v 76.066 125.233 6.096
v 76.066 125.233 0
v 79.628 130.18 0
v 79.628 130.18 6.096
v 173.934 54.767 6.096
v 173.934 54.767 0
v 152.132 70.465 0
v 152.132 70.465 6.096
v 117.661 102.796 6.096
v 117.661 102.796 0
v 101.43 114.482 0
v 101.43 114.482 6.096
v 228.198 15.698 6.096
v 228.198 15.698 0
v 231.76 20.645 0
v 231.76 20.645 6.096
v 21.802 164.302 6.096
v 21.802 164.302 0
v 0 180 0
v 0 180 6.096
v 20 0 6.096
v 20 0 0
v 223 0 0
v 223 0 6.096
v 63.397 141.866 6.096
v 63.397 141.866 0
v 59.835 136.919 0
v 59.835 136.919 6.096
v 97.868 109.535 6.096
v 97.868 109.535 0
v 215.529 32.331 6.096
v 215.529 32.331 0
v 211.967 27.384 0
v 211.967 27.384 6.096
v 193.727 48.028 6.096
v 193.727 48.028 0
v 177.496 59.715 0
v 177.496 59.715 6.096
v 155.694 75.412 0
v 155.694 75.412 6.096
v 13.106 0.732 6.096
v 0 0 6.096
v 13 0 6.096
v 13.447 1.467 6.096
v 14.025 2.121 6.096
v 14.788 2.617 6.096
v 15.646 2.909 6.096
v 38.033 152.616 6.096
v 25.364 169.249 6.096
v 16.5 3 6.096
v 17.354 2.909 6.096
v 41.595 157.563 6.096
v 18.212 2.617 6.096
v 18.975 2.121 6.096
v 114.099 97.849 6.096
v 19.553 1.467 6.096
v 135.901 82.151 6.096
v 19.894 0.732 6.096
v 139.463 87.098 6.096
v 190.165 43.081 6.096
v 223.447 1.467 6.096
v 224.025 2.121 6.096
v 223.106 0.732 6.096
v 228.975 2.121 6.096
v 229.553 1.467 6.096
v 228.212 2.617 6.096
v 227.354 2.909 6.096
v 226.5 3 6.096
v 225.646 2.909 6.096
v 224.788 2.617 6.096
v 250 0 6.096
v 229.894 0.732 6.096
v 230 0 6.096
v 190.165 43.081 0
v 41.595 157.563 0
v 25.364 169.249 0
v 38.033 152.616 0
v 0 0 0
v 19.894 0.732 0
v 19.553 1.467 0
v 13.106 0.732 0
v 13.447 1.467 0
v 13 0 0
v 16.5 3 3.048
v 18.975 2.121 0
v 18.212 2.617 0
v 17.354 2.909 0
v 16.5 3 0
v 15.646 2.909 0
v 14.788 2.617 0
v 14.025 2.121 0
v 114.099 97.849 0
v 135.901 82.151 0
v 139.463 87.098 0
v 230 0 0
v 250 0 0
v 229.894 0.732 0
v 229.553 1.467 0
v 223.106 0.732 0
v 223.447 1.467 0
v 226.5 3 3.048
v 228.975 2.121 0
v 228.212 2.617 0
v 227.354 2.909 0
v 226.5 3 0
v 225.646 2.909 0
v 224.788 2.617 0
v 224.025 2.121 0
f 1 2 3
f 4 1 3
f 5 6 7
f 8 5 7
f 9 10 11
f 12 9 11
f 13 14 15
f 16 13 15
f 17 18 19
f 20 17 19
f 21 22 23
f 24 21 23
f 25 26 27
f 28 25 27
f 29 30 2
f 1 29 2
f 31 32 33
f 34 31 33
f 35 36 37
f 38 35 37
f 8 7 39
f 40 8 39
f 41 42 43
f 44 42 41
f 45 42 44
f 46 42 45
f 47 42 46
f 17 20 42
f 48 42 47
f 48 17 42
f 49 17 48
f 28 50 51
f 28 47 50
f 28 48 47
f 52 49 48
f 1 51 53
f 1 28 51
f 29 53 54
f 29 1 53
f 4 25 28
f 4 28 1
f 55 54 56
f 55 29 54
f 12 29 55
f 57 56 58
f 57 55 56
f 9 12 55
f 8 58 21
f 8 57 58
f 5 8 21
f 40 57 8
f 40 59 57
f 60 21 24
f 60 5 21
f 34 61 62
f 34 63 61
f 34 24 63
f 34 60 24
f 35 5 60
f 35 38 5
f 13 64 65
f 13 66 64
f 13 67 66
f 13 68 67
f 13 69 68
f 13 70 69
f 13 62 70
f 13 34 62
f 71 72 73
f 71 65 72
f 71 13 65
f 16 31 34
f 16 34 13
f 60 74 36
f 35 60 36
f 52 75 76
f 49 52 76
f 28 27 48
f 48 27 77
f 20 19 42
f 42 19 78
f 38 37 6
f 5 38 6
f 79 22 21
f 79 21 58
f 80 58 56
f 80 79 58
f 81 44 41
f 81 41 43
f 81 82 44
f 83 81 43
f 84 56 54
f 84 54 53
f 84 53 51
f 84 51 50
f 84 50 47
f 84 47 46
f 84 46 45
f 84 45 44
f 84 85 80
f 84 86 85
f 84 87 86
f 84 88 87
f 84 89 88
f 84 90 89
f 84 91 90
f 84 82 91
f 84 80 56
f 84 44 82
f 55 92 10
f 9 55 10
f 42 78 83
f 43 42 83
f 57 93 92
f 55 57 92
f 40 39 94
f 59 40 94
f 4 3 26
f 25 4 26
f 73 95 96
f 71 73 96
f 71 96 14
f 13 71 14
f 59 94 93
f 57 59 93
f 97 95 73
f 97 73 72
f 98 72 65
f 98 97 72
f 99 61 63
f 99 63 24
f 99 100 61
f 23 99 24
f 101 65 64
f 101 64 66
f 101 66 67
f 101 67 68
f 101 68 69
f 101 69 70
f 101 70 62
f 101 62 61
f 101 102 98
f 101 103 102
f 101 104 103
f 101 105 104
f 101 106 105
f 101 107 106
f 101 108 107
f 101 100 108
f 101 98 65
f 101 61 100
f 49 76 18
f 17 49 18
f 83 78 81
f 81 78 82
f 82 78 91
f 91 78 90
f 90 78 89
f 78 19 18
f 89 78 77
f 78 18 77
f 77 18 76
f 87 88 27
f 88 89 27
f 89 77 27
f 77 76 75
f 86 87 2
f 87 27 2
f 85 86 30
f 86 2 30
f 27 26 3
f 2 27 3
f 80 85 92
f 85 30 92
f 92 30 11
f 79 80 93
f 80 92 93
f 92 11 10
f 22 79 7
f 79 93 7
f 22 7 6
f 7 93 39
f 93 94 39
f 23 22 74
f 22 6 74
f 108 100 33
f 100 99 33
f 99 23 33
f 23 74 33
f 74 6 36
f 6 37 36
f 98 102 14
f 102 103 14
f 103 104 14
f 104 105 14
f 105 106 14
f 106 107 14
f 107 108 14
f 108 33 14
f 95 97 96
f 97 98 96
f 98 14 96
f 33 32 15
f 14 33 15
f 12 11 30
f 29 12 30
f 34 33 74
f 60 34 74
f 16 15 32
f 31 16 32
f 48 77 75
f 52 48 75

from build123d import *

# Parameters (mm, degrees)
BOSS_EXTRUDE1_DEPTH = 6.096


with BuildPart() as part:
    # Sketch1 → Boss-Extrude1 (new body)
    with BuildSketch(Plane.XY):
        with BuildLine():
            Line((0, 0), (13, 0))
            add(Edge.make_bspline(
                [(20, 0), (20, 3), (16.5, 3), (13, 3), (13, 0)],
                knots=[3.141592654, 3.141592654, 3.141592654, 4.71238898, 4.71238898, 6.283185307, 6.283185307, 6.283185307], degree=2, weights=[1, 0.707106781, 1, 0.707106781, 1]))
            Line((20, 0), (223, 0))
            add(Edge.make_bspline(
                [(230, 0), (230, 3), (226.5, 3), (223, 3), (223, 0)],
                knots=[3.141592654, 3.141592654, 3.141592654, 4.71238898, 4.71238898, 6.283185307, 6.283185307, 6.283185307], degree=2, weights=[1, 0.707106781, 1, 0.707106781, 1]))
            Line((230, 0), (250, 0))
            Line((250, 0), (228.197731568, 15.697633271))
            Line((228.197731568, 15.697633271), (231.759653176, 20.644746617))
            Line((231.759653176, 20.644746617), (215.528966347, 32.330841134))
            Line((215.528966347, 32.330841134), (211.967044739, 27.383727788))
            Line((211.967044739, 27.383727788), (190.164776306, 43.081361059))
            Line((190.164776306, 43.081361059), (193.726697915, 48.028474405))
            Line((193.726697915, 48.028474405), (177.496011086, 59.714568922))
            Line((177.496011086, 59.714568922), (173.934089477, 54.767455576))
            Line((173.934089477, 54.767455576), (152.131821045, 70.465088847))
            Line((152.131821045, 70.465088847), (155.693742654, 75.412202193))
            Line((155.693742654, 75.412202193), (139.463055825, 87.09829671))
            Line((139.463055825, 87.09829671), (135.901134216, 82.151183364))
            Line((135.901134216, 82.151183364), (114.098865784, 97.848816636))
            Line((114.098865784, 97.848816636), (117.660787393, 102.795929981))
            Line((117.660787393, 102.795929981), (101.430100564, 114.482024498))
            Line((101.430100564, 114.482024498), (97.868178955, 109.534911153))
            Line((97.868178955, 109.534911153), (76.065910523, 125.232544424))
            Line((76.065910523, 125.232544424), (79.627832131, 130.179657769))
            Line((79.627832131, 130.179657769), (63.397145302, 141.865752286))
            Line((63.397145302, 141.865752286), (59.835223694, 136.918638941))
            Line((59.835223694, 136.918638941), (38.032955261, 152.616272212))
            Line((38.032955261, 152.616272212), (41.59487687, 157.563385557))
            Line((41.59487687, 157.563385557), (25.364190041, 169.249480074))
            Line((25.364190041, 169.249480074), (21.802268432, 164.302366729))
            Line((21.802268432, 164.302366729), (0, 180))
            Line((0, 180), (0, 0))
        make_face()
    extrude(amount=BOSS_EXTRUDE1_DEPTH)


solid = part.part
